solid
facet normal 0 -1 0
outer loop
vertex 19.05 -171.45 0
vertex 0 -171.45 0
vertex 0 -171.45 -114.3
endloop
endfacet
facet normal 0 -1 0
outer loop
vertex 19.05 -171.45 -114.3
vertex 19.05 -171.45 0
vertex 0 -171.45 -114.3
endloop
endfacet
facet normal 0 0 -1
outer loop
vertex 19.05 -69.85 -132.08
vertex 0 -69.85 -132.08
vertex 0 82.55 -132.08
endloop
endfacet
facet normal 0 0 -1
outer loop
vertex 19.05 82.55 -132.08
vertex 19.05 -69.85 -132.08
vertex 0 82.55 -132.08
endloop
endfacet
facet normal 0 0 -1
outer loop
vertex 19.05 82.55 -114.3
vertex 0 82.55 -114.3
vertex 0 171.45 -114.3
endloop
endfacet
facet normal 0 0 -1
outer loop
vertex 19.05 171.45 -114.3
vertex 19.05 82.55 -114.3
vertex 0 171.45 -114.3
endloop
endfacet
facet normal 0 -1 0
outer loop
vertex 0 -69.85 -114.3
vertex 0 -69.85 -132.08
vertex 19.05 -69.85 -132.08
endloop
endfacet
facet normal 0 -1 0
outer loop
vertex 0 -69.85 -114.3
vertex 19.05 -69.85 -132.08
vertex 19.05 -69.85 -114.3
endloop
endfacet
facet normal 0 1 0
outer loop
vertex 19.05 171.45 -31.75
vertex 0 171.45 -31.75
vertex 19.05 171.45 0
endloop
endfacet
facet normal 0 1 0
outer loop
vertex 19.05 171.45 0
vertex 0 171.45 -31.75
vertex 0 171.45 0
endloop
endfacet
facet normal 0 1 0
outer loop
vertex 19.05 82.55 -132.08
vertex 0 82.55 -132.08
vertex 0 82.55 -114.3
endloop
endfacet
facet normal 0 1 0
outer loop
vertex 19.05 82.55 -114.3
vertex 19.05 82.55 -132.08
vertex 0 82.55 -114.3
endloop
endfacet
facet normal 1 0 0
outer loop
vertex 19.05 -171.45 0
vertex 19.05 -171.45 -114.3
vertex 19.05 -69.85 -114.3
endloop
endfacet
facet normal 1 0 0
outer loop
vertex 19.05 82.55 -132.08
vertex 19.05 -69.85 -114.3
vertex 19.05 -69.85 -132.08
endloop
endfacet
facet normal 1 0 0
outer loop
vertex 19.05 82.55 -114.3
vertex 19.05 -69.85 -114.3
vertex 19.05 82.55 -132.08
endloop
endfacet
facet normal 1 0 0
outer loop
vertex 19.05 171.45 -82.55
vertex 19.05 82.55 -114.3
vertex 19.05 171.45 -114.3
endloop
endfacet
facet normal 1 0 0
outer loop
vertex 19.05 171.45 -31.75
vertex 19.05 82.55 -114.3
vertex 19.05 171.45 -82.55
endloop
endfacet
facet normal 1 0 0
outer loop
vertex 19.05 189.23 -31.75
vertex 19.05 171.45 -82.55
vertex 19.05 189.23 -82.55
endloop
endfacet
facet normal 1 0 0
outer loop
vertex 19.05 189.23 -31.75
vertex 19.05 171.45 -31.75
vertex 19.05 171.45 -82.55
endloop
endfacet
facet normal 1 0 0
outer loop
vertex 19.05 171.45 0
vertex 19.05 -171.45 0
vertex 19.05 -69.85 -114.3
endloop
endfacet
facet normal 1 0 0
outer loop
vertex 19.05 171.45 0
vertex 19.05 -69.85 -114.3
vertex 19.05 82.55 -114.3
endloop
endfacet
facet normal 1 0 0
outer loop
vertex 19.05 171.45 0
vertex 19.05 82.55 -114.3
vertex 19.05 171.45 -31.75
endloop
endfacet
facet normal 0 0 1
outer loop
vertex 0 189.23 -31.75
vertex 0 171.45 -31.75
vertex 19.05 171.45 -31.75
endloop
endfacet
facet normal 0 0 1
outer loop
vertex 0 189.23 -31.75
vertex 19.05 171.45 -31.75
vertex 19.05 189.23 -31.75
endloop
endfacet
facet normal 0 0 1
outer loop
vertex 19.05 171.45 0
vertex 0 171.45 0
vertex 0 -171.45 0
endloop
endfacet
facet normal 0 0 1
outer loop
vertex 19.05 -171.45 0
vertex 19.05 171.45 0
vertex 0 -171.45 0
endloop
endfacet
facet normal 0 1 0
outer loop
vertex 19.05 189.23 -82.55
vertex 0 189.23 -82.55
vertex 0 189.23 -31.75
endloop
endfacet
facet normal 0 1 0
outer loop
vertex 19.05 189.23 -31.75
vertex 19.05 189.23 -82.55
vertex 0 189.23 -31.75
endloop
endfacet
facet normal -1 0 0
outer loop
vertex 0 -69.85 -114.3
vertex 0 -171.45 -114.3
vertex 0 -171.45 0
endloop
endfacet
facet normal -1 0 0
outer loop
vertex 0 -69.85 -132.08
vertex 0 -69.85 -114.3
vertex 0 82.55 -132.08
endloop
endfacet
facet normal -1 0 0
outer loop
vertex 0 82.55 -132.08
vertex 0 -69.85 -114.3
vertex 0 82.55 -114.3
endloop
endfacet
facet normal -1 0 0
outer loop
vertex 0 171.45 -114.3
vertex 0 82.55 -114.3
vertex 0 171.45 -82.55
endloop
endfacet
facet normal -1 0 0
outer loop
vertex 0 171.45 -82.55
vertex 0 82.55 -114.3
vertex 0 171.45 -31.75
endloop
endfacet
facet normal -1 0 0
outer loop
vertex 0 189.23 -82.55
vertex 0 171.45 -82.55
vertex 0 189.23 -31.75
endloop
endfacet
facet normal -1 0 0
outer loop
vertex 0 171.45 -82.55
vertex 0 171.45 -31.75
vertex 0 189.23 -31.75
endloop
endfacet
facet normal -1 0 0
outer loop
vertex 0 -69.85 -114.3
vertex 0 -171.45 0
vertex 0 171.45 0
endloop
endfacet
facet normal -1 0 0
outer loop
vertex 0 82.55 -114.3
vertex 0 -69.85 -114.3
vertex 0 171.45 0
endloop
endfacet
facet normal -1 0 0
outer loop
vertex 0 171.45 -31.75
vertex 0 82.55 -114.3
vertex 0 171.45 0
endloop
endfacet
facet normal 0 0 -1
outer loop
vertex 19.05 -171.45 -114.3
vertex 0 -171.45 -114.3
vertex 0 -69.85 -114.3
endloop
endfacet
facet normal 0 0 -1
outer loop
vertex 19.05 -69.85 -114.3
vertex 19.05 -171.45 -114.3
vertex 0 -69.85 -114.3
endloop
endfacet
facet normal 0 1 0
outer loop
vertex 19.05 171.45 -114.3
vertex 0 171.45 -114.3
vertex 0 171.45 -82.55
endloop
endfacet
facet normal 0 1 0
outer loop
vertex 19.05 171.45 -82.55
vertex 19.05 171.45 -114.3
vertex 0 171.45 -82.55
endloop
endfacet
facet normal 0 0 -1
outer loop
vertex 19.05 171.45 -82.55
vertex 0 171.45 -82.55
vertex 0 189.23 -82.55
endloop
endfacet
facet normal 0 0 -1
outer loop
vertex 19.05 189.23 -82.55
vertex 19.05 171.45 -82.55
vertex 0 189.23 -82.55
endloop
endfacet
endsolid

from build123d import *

# Parameters (mm, degrees)
F0_W     = 152.4
F0_H     = 17.78
F0_W_2   = 17.78
F0_H_2   = 50.8
F1_DEPTH = 19.05


# Not quite as in the source:
# - a feature names something its author has since deleted; it is built from what else it names


with BuildPart() as f1:
    # F0 (on Right) → F1 (new body)
    with BuildSketch(Plane.YZ):
        Polygon((171.45, 0), (-171.45, 0), (-171.45, -114.3), (-69.85, -114.3), (82.55, -114.3), (171.45, -114.3), (171.45, -82.55), (171.45, -31.75), align=None)
        with Locations((6.35, -123.19)):
            Rectangle(F0_W, F0_H)
        with Locations((180.34, -57.15)):
            Rectangle(F0_W_2, F0_H_2)
    extrude(amount=F1_DEPTH)


solid = f1.part
